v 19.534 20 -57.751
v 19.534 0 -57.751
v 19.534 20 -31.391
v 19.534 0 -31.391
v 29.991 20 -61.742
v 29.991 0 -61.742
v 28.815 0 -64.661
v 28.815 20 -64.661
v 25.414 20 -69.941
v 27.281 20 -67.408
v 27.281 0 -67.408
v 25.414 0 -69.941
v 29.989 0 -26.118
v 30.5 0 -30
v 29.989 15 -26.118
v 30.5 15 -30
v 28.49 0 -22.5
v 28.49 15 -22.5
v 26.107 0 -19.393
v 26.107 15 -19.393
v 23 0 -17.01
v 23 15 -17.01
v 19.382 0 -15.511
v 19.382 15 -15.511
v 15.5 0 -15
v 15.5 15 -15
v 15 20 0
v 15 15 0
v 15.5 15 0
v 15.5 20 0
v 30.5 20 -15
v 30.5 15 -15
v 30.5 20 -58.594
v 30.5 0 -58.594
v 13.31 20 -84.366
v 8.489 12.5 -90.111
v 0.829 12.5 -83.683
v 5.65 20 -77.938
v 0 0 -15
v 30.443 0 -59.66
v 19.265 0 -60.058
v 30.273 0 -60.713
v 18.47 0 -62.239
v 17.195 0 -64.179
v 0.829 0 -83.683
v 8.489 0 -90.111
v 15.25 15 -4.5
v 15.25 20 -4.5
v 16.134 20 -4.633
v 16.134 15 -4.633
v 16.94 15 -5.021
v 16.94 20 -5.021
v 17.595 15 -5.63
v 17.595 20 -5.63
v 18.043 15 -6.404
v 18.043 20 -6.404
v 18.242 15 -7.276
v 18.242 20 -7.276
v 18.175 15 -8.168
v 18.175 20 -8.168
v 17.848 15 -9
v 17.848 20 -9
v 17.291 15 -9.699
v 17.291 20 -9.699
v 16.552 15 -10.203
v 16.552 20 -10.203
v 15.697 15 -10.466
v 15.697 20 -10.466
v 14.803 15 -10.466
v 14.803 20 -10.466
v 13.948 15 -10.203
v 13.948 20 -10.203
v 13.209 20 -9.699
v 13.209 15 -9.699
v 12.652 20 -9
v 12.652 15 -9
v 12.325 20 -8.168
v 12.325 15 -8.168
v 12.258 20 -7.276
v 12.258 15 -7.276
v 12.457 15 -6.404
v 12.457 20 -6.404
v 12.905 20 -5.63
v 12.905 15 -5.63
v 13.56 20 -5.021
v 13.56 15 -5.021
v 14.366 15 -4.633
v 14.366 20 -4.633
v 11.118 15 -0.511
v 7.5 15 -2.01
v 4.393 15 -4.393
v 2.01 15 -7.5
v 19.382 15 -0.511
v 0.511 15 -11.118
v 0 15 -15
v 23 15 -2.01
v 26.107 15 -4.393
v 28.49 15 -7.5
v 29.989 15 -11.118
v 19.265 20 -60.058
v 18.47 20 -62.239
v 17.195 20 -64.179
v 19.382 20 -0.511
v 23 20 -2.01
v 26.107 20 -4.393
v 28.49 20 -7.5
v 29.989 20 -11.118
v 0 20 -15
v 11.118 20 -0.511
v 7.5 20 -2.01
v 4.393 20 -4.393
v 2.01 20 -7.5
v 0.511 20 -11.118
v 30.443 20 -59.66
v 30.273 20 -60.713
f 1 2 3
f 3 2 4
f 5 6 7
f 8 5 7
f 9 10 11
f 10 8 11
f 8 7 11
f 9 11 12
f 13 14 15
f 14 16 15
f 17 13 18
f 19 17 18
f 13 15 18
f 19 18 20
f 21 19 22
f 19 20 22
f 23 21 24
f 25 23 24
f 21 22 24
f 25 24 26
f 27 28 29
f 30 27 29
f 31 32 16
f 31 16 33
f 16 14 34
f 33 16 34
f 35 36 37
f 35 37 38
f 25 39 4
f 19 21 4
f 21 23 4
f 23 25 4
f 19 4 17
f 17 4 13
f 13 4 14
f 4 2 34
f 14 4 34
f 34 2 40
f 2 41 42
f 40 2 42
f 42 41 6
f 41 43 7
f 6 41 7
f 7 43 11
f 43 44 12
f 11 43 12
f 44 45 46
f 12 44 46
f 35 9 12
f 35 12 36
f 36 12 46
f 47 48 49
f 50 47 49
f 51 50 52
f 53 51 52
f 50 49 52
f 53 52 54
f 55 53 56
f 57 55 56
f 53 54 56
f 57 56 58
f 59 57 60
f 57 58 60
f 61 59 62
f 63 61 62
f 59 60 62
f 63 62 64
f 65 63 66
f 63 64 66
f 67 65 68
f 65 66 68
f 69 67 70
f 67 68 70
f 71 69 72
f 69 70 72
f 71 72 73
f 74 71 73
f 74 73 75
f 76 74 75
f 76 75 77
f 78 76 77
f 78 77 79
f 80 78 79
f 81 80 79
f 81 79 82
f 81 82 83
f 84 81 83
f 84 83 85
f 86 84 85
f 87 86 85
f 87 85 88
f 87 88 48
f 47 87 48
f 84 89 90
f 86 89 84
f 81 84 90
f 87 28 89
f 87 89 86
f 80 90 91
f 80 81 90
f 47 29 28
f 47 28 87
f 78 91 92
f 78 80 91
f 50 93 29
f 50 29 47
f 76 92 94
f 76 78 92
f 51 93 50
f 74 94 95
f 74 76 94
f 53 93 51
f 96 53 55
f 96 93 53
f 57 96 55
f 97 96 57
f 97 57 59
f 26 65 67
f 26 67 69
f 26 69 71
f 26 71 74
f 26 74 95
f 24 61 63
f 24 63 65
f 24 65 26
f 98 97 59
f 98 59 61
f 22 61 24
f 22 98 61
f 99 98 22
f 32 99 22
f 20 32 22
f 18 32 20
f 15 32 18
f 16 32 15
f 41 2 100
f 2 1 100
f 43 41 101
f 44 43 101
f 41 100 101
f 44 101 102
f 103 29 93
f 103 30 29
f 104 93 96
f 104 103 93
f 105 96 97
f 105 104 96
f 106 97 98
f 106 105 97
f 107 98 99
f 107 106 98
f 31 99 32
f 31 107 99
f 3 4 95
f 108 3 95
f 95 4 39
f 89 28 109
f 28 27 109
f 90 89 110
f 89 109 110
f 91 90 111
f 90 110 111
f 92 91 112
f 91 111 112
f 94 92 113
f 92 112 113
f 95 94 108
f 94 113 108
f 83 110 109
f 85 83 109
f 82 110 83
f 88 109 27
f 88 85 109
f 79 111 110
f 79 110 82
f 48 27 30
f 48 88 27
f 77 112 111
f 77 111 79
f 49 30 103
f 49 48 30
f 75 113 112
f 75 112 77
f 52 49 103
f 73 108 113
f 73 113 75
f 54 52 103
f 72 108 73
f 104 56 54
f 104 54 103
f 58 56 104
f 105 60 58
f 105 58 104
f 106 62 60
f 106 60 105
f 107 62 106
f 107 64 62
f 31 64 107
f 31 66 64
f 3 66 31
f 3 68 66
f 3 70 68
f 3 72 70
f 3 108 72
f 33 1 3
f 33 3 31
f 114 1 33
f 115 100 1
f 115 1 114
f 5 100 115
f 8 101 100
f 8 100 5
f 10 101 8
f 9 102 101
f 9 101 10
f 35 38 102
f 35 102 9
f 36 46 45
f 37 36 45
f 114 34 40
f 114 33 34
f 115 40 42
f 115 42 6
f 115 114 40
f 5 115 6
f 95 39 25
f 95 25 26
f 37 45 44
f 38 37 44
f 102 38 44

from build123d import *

# Parameters (mm, degrees)
BOSS_EXTRUDE1_DEPTH = 20
SKETCH5_W           = 15
SKETCH5_H           = 15
CUT_EXTRUDE1_DEPTH  = 40
SKETCH6_R           = 3
CUT_EXTRUDE2_DEPTH  = 34
FILLET1_R           = 15
FILLET2_R           = 15
FILLET3_R           = 25
FILLET4_R           = 10
CUT_EXTRUDE3_DEPTH  = 34
FILLET5_R           = 10


# Some blends are built 0.0001 mm under size
with BuildPart() as part:
    # Sketch3 → Boss-Extrude1 (new body)
    with BuildSketch(Plane(origin=(0, 0, 0), x_dir=(1, 0, 0), z_dir=(0, 1, 0))):
        Polygon((0, 0), (30.5, 0), (30.5, 60), (29.894285691, 64.601573483), (8.489458289, 90.110853439), (0.829013858, 83.682977342), (19.5341333, 61.391084047), (19.5341333, 31.391084047), (0, 15), align=None)
    extrude(amount=BOSS_EXTRUDE1_DEPTH)

    # Sketch5 → Cut-Extrude1 (cut)
    with BuildSketch(Plane(origin=(30.5, 0, 0), x_dir=(0, 0, -1), z_dir=(1, 0, 0))):
        with Locations((7.5, 7.5)):
            Rectangle(SKETCH5_W, SKETCH5_H)
    extrude(amount=-CUT_EXTRUDE1_DEPTH, mode=Mode.SUBTRACT)

    # Sketch6 → Cut-Extrude2 (cut)
    with BuildSketch(Plane(origin=(0, 20, 0), x_dir=(1, 0, 0), z_dir=(0, 1, 0))):
        with Locations(Location((15.25, 7.5, 0), (0, 0, 270))):
            Circle(SKETCH6_R)
    extrude(amount=-CUT_EXTRUDE2_DEPTH, mode=Mode.SUBTRACT)

    # Fillet1
    fillet1_edges = [part.edges().sort_by_distance(p)[0] for p in [
        (0, 17.5, 0),
        (30.5, 17.5, 0),
    ]]
    fillet(fillet1_edges, radius=FILLET1_R - 0.0001)  # a hair under: the kernel refuses the full size

    # Fillet2
    fillet2_edges = [part.edges().sort_by_distance(p)[0] for p in [
        (30.5, 7.5, -15),
    ]]
    fillet(fillet2_edges, radius=FILLET2_R)

    # Fillet3
    # the kernel refuses this fillet: 25 mm, written as the material it takes off along each edge
    with BuildSketch(Plane(origin=(29.894285691, -17.425359882, -64.601573483), x_dir=(-0.64278760968654, 0, -0.7660444431189775), z_dir=(0, 1, 0))) as fillet3_piece_1:
        with BuildLine():
            CenterArc((6.970143953, 25), FILLET3_R, 244.190525193, 25.809474807)
            Line((-3.914355449, 2.49383034), (-4.132045437, 2.043706946))
            ThreePointArc((-4.132045437, 2.043706946), (-2.225836026, 0.825224861), (-0.268658302, -0.421690309))
            Line((-0.268658302, -0.421690309), (0, -0.5))
            Line((0, -0.5), (6.970143953, -0.5))
            Line((6.970143953, -0.5), (6.970143953, 0))
        make_face()
    extrude(amount=54.850719763, mode=Mode.SUBTRACT)

    # Fillet4
    fillet4_edges = [part.edges().sort_by_distance(p)[0] for p in [
        (19.5341333, 10, -61.391084047),
    ]]
    fillet(fillet4_edges, radius=FILLET4_R)

    # Sketch7 → Cut-Extrude3 (cut)
    with BuildSketch(Plane(origin=(49.352752173, 0, -41.411876146), x_dir=(-0.6427876096865405, 0, -0.7660444431189772), z_dir=(0.7660444431189772, 0, -0.6427876096865404))):
        Polygon((56.07199994, 20), (63.57199994, 20), (63.57199994, 12.5), align=None)
    extrude(amount=-CUT_EXTRUDE3_DEPTH, mode=Mode.SUBTRACT)

    # Fillet5
    fillet5_edges = [part.edges().sort_by_distance(p)[0] for p in [
        (30.5, 10, -60),
    ]]
    fillet(fillet5_edges, radius=FILLET5_R)


solid = part.part
